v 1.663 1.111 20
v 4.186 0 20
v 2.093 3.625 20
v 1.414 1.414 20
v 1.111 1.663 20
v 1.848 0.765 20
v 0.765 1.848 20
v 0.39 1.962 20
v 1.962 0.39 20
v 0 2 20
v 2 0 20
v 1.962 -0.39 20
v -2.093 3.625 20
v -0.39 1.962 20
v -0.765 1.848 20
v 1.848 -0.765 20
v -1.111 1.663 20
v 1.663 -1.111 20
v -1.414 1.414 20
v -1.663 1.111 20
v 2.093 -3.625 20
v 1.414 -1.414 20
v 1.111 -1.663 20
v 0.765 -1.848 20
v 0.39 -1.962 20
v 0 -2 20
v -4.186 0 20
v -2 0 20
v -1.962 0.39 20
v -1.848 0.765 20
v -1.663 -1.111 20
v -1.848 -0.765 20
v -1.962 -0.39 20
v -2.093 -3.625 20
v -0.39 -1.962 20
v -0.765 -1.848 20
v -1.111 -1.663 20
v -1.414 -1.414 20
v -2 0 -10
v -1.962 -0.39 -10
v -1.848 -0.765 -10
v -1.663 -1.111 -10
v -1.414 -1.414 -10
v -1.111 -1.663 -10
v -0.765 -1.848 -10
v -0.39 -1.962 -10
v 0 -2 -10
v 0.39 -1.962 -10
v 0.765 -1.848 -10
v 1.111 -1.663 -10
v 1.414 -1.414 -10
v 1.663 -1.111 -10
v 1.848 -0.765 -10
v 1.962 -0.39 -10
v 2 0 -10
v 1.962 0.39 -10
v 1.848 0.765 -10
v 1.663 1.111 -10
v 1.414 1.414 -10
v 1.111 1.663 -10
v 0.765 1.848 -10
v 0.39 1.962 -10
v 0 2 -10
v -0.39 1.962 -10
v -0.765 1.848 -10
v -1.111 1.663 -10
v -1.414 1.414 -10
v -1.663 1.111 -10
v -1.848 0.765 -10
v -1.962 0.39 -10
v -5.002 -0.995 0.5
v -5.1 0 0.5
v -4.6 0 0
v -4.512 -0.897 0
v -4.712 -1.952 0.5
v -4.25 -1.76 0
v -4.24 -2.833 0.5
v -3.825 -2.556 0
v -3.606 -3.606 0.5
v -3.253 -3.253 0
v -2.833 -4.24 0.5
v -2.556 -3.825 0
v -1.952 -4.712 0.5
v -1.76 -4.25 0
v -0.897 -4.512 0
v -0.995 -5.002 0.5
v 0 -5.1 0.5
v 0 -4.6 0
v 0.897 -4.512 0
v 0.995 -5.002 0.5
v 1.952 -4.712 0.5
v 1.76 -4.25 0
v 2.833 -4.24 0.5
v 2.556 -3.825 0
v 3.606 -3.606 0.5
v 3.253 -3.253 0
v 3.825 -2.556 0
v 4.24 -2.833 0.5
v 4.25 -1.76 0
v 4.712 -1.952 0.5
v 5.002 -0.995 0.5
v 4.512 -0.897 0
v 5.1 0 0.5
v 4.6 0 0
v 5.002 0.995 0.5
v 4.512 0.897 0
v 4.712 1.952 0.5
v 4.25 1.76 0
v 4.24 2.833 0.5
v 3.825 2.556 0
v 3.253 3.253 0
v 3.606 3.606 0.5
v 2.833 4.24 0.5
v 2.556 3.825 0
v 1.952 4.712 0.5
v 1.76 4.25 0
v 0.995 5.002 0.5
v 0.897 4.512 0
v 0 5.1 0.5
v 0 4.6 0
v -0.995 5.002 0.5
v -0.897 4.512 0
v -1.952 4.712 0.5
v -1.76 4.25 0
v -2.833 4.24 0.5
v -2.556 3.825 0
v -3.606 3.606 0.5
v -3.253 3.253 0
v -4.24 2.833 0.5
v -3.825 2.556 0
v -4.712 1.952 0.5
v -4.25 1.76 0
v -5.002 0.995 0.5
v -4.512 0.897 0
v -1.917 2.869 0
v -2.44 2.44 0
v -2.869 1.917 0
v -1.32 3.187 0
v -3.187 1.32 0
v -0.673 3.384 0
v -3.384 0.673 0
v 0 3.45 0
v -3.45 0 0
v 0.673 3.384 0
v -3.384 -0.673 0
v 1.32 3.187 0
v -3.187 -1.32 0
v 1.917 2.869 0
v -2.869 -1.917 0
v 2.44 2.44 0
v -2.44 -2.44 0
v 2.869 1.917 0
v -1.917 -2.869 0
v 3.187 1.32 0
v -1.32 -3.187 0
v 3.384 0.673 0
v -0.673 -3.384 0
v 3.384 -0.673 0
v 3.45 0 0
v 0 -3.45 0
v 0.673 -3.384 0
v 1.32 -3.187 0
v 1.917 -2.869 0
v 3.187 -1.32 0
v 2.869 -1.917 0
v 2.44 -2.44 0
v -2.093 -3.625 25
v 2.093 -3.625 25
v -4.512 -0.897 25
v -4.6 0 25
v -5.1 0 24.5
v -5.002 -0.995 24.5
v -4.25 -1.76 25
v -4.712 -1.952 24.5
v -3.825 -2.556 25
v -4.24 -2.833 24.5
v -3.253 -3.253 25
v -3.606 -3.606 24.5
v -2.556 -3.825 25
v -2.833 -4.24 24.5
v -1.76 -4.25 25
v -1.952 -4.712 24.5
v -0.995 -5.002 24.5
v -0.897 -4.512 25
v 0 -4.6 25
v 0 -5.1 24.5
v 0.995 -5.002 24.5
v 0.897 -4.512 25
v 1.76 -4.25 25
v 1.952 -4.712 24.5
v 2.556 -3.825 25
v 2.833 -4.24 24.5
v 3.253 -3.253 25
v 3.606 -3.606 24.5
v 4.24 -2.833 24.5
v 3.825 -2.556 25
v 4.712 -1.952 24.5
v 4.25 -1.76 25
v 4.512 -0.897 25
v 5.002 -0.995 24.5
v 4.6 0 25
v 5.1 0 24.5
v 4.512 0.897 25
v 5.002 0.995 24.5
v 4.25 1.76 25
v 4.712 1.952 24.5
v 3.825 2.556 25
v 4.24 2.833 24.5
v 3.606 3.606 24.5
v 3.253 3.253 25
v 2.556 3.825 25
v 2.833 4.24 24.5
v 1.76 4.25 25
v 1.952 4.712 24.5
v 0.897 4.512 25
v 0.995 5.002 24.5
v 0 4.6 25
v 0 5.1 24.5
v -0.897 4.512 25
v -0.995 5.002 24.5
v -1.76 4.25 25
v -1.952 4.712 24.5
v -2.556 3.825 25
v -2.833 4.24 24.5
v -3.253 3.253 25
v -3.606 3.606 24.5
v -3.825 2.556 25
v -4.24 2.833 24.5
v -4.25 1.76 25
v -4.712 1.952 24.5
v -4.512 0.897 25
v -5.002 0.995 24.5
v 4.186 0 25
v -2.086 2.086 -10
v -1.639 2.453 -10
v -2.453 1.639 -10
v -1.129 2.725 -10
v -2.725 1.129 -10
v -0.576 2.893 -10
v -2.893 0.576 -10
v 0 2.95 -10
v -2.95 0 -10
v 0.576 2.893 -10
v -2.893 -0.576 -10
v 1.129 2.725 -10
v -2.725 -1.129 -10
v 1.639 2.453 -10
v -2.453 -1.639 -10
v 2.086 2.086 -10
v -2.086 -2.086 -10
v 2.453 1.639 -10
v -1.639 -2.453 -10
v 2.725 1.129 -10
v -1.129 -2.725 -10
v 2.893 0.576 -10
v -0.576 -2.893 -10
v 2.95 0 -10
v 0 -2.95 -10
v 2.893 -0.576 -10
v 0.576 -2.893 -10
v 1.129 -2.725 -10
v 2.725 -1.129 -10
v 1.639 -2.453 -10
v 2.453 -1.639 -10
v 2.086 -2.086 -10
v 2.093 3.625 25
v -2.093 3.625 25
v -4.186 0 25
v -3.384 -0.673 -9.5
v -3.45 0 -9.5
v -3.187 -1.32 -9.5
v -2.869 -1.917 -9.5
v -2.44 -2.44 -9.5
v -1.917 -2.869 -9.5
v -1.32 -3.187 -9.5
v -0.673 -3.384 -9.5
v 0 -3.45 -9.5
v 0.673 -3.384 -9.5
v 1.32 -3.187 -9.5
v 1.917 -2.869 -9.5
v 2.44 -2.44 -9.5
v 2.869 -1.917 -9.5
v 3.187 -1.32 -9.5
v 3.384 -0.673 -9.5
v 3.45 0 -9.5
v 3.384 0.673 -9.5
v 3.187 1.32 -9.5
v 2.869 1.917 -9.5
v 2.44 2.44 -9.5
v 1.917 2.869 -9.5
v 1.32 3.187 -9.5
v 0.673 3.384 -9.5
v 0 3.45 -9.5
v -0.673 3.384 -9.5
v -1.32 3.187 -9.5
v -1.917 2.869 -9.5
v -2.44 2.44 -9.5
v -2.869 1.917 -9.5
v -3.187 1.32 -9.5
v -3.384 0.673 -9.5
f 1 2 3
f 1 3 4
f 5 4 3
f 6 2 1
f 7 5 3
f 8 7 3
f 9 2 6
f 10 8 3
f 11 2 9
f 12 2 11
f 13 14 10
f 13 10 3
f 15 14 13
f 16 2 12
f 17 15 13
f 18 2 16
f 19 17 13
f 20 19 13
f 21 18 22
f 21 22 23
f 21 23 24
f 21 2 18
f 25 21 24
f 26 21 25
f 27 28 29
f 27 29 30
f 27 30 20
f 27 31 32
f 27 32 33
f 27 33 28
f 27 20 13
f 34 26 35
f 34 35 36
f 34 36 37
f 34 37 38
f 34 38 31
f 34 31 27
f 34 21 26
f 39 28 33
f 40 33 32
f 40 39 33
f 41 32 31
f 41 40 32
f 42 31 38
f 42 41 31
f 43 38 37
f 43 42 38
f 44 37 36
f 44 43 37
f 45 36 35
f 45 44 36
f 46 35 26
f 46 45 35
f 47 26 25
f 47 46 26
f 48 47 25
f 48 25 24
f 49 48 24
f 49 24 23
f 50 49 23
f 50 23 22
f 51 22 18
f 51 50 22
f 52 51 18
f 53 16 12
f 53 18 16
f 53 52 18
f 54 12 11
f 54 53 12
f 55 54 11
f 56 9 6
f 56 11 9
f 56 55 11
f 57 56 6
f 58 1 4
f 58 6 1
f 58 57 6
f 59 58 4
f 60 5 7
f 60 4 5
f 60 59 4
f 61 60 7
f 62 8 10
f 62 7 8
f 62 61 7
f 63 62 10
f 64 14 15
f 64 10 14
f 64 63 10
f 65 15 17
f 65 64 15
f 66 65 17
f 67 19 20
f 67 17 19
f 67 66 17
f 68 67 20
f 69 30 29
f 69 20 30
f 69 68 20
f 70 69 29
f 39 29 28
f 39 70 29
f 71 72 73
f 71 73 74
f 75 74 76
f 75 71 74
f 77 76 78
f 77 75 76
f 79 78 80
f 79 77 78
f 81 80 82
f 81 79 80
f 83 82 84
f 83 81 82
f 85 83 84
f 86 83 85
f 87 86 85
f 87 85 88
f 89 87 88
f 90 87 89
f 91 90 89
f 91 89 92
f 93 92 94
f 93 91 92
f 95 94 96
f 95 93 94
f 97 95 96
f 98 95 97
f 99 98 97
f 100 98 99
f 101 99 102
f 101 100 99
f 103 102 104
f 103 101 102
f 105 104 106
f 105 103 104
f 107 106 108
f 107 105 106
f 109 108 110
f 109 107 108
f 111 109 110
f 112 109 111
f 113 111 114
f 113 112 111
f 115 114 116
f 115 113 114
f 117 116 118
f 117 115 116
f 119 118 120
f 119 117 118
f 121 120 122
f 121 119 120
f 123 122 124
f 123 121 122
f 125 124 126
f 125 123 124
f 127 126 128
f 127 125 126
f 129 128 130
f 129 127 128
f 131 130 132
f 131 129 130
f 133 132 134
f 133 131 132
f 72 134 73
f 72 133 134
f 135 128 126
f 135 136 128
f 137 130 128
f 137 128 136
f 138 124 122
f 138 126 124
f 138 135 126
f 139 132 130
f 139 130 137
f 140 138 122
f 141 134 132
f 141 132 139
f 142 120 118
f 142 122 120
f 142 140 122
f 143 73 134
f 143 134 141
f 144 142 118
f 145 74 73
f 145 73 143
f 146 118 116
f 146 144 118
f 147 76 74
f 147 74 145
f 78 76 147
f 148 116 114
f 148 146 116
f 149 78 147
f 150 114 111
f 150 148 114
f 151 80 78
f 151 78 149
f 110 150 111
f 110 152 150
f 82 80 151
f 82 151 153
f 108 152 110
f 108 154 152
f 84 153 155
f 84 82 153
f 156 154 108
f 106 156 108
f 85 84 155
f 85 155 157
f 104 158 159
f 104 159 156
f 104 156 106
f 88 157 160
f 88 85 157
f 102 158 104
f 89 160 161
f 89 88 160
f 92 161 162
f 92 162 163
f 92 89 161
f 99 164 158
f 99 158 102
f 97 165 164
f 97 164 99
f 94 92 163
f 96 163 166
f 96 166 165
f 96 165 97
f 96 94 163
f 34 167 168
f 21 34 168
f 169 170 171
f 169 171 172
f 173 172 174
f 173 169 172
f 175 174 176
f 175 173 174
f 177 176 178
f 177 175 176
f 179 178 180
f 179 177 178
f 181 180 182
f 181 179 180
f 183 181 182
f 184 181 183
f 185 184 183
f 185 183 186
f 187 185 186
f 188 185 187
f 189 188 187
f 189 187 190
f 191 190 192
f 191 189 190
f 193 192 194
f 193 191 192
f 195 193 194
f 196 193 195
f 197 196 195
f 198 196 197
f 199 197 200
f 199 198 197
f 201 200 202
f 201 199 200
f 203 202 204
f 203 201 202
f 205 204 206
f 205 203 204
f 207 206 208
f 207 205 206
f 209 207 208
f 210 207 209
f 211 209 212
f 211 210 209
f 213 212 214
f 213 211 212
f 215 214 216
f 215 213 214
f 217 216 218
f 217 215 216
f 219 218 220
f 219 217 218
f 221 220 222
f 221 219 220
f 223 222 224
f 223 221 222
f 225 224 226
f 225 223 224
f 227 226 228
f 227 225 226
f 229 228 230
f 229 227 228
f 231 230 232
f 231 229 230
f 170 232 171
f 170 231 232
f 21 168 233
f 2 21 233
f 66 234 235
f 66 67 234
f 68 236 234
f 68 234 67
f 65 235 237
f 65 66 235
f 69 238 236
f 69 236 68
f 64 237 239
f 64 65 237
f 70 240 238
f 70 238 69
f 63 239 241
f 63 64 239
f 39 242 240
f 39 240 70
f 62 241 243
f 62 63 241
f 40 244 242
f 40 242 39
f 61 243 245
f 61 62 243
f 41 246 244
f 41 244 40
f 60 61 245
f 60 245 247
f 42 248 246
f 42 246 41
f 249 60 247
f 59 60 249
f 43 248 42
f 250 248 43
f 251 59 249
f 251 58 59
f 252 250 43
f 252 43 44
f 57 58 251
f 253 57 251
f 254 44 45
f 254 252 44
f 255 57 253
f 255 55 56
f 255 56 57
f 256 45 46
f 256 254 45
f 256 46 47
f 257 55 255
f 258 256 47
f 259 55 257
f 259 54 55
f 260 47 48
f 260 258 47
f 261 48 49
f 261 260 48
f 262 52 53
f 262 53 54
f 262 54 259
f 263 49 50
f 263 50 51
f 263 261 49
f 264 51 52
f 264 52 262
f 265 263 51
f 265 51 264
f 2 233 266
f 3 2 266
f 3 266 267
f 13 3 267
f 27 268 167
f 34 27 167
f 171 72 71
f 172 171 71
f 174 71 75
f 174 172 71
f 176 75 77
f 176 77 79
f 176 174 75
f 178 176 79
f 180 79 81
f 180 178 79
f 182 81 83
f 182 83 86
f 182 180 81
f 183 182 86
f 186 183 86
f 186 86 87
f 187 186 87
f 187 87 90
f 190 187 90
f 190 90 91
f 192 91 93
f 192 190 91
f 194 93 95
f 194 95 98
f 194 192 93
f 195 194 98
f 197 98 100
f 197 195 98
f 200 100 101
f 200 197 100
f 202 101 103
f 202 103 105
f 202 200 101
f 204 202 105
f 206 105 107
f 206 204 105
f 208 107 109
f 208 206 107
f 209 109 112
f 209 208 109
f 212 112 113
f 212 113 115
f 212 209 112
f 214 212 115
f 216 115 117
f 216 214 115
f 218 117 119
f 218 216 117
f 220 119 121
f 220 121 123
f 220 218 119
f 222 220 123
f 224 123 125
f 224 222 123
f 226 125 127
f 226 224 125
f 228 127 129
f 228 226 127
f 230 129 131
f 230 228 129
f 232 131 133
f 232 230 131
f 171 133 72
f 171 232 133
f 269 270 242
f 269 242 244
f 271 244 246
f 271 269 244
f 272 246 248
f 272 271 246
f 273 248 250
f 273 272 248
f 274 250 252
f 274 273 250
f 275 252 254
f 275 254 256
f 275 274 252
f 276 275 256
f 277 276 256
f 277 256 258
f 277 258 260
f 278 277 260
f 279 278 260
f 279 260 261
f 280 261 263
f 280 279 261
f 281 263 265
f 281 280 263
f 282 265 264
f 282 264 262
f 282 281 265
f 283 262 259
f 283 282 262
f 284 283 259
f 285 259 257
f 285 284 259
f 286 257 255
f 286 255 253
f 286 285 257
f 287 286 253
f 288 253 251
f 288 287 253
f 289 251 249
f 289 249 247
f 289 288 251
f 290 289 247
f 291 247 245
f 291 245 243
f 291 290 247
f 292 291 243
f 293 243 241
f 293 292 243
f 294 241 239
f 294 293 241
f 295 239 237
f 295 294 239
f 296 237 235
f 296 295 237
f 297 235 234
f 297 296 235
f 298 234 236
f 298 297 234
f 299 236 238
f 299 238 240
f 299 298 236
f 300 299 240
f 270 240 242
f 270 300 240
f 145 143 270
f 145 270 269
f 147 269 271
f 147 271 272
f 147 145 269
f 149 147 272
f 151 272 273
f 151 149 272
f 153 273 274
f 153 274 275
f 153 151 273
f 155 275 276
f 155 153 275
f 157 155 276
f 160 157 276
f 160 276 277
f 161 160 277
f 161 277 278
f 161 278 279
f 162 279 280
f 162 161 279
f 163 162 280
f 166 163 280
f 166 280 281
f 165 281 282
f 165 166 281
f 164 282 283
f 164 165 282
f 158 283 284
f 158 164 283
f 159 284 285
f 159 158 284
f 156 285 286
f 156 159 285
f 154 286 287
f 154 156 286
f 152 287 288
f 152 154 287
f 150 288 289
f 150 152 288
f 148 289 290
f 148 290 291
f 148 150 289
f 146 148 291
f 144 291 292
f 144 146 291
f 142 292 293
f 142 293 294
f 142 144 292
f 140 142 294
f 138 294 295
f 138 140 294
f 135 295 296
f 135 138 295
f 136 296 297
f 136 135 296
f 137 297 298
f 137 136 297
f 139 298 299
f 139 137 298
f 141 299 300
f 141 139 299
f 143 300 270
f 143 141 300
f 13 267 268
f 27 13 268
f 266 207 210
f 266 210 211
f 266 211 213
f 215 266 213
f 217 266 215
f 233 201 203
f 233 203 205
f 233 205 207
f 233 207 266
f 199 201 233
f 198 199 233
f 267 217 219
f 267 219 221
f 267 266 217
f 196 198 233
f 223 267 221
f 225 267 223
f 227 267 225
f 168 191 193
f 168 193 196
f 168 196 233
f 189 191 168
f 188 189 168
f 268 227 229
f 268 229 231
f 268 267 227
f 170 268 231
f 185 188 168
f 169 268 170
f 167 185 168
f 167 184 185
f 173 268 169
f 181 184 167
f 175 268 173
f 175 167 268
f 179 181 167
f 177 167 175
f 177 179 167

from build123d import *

# Parameters (mm, degrees)
POCKET_DEPTH = 5
CHAMFER_SIZE = 0.5


with BuildPart() as part:
    # Sketch → Revolution (revolve)
    with BuildSketch(Plane.XZ):
        Polygon((-2, -10), (-3.45, -10), (-3.45, 0), (-5.1, 0), (-5.1, 25), (-2, 25), align=None)
    revolve(axis=Axis((0, 0, 0), (0, 0, 1)))

    # Sketch001 (on Face5 of Revolution) → Pocket (cut)
    with BuildSketch(Plane(origin=(0, 0, 25), x_dir=(-1, 0, 0), z_dir=(0, 0, 1))):
        Polygon((2.092895, -3.625), (4.185789, 0), (2.092895, 3.625), (-2.092895, 3.625), (-4.185789, 0), (-2.092895, -3.625), align=None)
    extrude(amount=-POCKET_DEPTH, mode=Mode.SUBTRACT)

    # Chamfer
    chamfer_edges = [part.edges().sort_by_distance(p)[0] for p in [
        (3.45, 0, -10),
        (5.1, 0, 0),
        (5.1, 0, 25),
    ]]
    chamfer(chamfer_edges, length=CHAMFER_SIZE)


solid = part.part
